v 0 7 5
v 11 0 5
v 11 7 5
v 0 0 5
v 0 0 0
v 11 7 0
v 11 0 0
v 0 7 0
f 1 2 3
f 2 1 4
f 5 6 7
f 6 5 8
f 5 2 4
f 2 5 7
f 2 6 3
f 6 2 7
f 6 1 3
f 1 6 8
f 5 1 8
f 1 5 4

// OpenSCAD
// Generated by SolidPython 1.0.1 on 2020-07-29 00:46:55


cube(size = [11, 7, 5]);
/***********************************************
*********      SolidPython code:      **********
************************************************
 
# import packages: SolidPython
from solid import *
from solid.utils import *
from itertools import chain, combinations, permutations


class Resize:

    def __init__(self, scad_file):
        self.scad_file = scad_file
        #self.scad_file = import_scad(scad_file)
        # cone/cylinder param:
        self.r1 = 0
        self.r2 = 0
        self.h = 0
        # rectangular prism param:
        self.w = 0
        self.l = 0
        # ellipse param:
        self.r = 0

    # import OpenScad code (file name corresponds to shape)


    # classify shape + parameters
    def assign(self, param1, param2, param3):
        if self.scad_file == 'cone.scad':
            self.r1 = param1
            self.r2 = param2
            self.h = param3
        elif self.scad_file == 'cylinder.scad':
            self.r1 = param1
            self.r2 = param2
            self.h = param3
        elif self.scad_file == 'rectangularPrism.scad':
            self.h = param1
            self.l = param2
            self.w = param3
        else:
            self.r = param1
            self.h = param2

    # resize parameters
    def iterate(self):
        x = range(3, 20, 2)
        i = 1
        if self.scad_file == 'cone.scad':
            tempList = list(permutations(x, 2))
            for temp in tempList:
                param1 = temp[0]
                param2 = temp[1]
                filepath = 'produced_scad_files/' + 'cone' + str(param1) + '_' + str(param2) + '_' + '.scad'
                scad_render_to_file(cylinder(h=param1, r1=param2, r2=0), filepath)

        elif self.scad_file == 'cylinder.scad':
            tempList = list(permutations(x, 3))
            for temp in tempList:
                param1 = temp[0]
                param2 = temp[1]
                filepath = 'produced_scad_files/' + 'cylinder' + str(param1) + '_' + str(param2) + '_' + '.scad'
                scad_render_to_file(cylinder(h=param1, r1=param2, r2=param2), filepath)

        elif self.scad_file == 'rectangularPrism.scad':
            tempList = list(permutations(x, 3))
            for temp in tempList:
                param1 = temp[0]
                param2 = temp[1]
                param3 = temp[2]
                filepath = 'produced_scad_files/' + 'rectangularPrism' + str(param1) + '_' + str(param2) + '_' + str(
                    param3) + '.scad'
                scad_render_to_file(cube(size=(param1, param2, param3)), filepath)

        elif self.scad_file == 'ellipse.scad':
            tempList = list(permutations(x, 4))
            for temp in tempList:
                param1 = temp[0]
                param2 = temp[1]
                param3 = temp[2]
                param4 = temp[3]
                filepath = 'produced_scad_files/' + 'ellipse' + str(param1) + '_' + str(param2) + '_' + str(param3) + '_' + str(param4) + '.scad'
                scad_render_to_file(scale([param1, param2, param3])(sphere(r=param4)), filepath)

    def render_to_scadfile(self):
        scad_render_to_file(scad, 'example.scad') 
 
************************************************/
